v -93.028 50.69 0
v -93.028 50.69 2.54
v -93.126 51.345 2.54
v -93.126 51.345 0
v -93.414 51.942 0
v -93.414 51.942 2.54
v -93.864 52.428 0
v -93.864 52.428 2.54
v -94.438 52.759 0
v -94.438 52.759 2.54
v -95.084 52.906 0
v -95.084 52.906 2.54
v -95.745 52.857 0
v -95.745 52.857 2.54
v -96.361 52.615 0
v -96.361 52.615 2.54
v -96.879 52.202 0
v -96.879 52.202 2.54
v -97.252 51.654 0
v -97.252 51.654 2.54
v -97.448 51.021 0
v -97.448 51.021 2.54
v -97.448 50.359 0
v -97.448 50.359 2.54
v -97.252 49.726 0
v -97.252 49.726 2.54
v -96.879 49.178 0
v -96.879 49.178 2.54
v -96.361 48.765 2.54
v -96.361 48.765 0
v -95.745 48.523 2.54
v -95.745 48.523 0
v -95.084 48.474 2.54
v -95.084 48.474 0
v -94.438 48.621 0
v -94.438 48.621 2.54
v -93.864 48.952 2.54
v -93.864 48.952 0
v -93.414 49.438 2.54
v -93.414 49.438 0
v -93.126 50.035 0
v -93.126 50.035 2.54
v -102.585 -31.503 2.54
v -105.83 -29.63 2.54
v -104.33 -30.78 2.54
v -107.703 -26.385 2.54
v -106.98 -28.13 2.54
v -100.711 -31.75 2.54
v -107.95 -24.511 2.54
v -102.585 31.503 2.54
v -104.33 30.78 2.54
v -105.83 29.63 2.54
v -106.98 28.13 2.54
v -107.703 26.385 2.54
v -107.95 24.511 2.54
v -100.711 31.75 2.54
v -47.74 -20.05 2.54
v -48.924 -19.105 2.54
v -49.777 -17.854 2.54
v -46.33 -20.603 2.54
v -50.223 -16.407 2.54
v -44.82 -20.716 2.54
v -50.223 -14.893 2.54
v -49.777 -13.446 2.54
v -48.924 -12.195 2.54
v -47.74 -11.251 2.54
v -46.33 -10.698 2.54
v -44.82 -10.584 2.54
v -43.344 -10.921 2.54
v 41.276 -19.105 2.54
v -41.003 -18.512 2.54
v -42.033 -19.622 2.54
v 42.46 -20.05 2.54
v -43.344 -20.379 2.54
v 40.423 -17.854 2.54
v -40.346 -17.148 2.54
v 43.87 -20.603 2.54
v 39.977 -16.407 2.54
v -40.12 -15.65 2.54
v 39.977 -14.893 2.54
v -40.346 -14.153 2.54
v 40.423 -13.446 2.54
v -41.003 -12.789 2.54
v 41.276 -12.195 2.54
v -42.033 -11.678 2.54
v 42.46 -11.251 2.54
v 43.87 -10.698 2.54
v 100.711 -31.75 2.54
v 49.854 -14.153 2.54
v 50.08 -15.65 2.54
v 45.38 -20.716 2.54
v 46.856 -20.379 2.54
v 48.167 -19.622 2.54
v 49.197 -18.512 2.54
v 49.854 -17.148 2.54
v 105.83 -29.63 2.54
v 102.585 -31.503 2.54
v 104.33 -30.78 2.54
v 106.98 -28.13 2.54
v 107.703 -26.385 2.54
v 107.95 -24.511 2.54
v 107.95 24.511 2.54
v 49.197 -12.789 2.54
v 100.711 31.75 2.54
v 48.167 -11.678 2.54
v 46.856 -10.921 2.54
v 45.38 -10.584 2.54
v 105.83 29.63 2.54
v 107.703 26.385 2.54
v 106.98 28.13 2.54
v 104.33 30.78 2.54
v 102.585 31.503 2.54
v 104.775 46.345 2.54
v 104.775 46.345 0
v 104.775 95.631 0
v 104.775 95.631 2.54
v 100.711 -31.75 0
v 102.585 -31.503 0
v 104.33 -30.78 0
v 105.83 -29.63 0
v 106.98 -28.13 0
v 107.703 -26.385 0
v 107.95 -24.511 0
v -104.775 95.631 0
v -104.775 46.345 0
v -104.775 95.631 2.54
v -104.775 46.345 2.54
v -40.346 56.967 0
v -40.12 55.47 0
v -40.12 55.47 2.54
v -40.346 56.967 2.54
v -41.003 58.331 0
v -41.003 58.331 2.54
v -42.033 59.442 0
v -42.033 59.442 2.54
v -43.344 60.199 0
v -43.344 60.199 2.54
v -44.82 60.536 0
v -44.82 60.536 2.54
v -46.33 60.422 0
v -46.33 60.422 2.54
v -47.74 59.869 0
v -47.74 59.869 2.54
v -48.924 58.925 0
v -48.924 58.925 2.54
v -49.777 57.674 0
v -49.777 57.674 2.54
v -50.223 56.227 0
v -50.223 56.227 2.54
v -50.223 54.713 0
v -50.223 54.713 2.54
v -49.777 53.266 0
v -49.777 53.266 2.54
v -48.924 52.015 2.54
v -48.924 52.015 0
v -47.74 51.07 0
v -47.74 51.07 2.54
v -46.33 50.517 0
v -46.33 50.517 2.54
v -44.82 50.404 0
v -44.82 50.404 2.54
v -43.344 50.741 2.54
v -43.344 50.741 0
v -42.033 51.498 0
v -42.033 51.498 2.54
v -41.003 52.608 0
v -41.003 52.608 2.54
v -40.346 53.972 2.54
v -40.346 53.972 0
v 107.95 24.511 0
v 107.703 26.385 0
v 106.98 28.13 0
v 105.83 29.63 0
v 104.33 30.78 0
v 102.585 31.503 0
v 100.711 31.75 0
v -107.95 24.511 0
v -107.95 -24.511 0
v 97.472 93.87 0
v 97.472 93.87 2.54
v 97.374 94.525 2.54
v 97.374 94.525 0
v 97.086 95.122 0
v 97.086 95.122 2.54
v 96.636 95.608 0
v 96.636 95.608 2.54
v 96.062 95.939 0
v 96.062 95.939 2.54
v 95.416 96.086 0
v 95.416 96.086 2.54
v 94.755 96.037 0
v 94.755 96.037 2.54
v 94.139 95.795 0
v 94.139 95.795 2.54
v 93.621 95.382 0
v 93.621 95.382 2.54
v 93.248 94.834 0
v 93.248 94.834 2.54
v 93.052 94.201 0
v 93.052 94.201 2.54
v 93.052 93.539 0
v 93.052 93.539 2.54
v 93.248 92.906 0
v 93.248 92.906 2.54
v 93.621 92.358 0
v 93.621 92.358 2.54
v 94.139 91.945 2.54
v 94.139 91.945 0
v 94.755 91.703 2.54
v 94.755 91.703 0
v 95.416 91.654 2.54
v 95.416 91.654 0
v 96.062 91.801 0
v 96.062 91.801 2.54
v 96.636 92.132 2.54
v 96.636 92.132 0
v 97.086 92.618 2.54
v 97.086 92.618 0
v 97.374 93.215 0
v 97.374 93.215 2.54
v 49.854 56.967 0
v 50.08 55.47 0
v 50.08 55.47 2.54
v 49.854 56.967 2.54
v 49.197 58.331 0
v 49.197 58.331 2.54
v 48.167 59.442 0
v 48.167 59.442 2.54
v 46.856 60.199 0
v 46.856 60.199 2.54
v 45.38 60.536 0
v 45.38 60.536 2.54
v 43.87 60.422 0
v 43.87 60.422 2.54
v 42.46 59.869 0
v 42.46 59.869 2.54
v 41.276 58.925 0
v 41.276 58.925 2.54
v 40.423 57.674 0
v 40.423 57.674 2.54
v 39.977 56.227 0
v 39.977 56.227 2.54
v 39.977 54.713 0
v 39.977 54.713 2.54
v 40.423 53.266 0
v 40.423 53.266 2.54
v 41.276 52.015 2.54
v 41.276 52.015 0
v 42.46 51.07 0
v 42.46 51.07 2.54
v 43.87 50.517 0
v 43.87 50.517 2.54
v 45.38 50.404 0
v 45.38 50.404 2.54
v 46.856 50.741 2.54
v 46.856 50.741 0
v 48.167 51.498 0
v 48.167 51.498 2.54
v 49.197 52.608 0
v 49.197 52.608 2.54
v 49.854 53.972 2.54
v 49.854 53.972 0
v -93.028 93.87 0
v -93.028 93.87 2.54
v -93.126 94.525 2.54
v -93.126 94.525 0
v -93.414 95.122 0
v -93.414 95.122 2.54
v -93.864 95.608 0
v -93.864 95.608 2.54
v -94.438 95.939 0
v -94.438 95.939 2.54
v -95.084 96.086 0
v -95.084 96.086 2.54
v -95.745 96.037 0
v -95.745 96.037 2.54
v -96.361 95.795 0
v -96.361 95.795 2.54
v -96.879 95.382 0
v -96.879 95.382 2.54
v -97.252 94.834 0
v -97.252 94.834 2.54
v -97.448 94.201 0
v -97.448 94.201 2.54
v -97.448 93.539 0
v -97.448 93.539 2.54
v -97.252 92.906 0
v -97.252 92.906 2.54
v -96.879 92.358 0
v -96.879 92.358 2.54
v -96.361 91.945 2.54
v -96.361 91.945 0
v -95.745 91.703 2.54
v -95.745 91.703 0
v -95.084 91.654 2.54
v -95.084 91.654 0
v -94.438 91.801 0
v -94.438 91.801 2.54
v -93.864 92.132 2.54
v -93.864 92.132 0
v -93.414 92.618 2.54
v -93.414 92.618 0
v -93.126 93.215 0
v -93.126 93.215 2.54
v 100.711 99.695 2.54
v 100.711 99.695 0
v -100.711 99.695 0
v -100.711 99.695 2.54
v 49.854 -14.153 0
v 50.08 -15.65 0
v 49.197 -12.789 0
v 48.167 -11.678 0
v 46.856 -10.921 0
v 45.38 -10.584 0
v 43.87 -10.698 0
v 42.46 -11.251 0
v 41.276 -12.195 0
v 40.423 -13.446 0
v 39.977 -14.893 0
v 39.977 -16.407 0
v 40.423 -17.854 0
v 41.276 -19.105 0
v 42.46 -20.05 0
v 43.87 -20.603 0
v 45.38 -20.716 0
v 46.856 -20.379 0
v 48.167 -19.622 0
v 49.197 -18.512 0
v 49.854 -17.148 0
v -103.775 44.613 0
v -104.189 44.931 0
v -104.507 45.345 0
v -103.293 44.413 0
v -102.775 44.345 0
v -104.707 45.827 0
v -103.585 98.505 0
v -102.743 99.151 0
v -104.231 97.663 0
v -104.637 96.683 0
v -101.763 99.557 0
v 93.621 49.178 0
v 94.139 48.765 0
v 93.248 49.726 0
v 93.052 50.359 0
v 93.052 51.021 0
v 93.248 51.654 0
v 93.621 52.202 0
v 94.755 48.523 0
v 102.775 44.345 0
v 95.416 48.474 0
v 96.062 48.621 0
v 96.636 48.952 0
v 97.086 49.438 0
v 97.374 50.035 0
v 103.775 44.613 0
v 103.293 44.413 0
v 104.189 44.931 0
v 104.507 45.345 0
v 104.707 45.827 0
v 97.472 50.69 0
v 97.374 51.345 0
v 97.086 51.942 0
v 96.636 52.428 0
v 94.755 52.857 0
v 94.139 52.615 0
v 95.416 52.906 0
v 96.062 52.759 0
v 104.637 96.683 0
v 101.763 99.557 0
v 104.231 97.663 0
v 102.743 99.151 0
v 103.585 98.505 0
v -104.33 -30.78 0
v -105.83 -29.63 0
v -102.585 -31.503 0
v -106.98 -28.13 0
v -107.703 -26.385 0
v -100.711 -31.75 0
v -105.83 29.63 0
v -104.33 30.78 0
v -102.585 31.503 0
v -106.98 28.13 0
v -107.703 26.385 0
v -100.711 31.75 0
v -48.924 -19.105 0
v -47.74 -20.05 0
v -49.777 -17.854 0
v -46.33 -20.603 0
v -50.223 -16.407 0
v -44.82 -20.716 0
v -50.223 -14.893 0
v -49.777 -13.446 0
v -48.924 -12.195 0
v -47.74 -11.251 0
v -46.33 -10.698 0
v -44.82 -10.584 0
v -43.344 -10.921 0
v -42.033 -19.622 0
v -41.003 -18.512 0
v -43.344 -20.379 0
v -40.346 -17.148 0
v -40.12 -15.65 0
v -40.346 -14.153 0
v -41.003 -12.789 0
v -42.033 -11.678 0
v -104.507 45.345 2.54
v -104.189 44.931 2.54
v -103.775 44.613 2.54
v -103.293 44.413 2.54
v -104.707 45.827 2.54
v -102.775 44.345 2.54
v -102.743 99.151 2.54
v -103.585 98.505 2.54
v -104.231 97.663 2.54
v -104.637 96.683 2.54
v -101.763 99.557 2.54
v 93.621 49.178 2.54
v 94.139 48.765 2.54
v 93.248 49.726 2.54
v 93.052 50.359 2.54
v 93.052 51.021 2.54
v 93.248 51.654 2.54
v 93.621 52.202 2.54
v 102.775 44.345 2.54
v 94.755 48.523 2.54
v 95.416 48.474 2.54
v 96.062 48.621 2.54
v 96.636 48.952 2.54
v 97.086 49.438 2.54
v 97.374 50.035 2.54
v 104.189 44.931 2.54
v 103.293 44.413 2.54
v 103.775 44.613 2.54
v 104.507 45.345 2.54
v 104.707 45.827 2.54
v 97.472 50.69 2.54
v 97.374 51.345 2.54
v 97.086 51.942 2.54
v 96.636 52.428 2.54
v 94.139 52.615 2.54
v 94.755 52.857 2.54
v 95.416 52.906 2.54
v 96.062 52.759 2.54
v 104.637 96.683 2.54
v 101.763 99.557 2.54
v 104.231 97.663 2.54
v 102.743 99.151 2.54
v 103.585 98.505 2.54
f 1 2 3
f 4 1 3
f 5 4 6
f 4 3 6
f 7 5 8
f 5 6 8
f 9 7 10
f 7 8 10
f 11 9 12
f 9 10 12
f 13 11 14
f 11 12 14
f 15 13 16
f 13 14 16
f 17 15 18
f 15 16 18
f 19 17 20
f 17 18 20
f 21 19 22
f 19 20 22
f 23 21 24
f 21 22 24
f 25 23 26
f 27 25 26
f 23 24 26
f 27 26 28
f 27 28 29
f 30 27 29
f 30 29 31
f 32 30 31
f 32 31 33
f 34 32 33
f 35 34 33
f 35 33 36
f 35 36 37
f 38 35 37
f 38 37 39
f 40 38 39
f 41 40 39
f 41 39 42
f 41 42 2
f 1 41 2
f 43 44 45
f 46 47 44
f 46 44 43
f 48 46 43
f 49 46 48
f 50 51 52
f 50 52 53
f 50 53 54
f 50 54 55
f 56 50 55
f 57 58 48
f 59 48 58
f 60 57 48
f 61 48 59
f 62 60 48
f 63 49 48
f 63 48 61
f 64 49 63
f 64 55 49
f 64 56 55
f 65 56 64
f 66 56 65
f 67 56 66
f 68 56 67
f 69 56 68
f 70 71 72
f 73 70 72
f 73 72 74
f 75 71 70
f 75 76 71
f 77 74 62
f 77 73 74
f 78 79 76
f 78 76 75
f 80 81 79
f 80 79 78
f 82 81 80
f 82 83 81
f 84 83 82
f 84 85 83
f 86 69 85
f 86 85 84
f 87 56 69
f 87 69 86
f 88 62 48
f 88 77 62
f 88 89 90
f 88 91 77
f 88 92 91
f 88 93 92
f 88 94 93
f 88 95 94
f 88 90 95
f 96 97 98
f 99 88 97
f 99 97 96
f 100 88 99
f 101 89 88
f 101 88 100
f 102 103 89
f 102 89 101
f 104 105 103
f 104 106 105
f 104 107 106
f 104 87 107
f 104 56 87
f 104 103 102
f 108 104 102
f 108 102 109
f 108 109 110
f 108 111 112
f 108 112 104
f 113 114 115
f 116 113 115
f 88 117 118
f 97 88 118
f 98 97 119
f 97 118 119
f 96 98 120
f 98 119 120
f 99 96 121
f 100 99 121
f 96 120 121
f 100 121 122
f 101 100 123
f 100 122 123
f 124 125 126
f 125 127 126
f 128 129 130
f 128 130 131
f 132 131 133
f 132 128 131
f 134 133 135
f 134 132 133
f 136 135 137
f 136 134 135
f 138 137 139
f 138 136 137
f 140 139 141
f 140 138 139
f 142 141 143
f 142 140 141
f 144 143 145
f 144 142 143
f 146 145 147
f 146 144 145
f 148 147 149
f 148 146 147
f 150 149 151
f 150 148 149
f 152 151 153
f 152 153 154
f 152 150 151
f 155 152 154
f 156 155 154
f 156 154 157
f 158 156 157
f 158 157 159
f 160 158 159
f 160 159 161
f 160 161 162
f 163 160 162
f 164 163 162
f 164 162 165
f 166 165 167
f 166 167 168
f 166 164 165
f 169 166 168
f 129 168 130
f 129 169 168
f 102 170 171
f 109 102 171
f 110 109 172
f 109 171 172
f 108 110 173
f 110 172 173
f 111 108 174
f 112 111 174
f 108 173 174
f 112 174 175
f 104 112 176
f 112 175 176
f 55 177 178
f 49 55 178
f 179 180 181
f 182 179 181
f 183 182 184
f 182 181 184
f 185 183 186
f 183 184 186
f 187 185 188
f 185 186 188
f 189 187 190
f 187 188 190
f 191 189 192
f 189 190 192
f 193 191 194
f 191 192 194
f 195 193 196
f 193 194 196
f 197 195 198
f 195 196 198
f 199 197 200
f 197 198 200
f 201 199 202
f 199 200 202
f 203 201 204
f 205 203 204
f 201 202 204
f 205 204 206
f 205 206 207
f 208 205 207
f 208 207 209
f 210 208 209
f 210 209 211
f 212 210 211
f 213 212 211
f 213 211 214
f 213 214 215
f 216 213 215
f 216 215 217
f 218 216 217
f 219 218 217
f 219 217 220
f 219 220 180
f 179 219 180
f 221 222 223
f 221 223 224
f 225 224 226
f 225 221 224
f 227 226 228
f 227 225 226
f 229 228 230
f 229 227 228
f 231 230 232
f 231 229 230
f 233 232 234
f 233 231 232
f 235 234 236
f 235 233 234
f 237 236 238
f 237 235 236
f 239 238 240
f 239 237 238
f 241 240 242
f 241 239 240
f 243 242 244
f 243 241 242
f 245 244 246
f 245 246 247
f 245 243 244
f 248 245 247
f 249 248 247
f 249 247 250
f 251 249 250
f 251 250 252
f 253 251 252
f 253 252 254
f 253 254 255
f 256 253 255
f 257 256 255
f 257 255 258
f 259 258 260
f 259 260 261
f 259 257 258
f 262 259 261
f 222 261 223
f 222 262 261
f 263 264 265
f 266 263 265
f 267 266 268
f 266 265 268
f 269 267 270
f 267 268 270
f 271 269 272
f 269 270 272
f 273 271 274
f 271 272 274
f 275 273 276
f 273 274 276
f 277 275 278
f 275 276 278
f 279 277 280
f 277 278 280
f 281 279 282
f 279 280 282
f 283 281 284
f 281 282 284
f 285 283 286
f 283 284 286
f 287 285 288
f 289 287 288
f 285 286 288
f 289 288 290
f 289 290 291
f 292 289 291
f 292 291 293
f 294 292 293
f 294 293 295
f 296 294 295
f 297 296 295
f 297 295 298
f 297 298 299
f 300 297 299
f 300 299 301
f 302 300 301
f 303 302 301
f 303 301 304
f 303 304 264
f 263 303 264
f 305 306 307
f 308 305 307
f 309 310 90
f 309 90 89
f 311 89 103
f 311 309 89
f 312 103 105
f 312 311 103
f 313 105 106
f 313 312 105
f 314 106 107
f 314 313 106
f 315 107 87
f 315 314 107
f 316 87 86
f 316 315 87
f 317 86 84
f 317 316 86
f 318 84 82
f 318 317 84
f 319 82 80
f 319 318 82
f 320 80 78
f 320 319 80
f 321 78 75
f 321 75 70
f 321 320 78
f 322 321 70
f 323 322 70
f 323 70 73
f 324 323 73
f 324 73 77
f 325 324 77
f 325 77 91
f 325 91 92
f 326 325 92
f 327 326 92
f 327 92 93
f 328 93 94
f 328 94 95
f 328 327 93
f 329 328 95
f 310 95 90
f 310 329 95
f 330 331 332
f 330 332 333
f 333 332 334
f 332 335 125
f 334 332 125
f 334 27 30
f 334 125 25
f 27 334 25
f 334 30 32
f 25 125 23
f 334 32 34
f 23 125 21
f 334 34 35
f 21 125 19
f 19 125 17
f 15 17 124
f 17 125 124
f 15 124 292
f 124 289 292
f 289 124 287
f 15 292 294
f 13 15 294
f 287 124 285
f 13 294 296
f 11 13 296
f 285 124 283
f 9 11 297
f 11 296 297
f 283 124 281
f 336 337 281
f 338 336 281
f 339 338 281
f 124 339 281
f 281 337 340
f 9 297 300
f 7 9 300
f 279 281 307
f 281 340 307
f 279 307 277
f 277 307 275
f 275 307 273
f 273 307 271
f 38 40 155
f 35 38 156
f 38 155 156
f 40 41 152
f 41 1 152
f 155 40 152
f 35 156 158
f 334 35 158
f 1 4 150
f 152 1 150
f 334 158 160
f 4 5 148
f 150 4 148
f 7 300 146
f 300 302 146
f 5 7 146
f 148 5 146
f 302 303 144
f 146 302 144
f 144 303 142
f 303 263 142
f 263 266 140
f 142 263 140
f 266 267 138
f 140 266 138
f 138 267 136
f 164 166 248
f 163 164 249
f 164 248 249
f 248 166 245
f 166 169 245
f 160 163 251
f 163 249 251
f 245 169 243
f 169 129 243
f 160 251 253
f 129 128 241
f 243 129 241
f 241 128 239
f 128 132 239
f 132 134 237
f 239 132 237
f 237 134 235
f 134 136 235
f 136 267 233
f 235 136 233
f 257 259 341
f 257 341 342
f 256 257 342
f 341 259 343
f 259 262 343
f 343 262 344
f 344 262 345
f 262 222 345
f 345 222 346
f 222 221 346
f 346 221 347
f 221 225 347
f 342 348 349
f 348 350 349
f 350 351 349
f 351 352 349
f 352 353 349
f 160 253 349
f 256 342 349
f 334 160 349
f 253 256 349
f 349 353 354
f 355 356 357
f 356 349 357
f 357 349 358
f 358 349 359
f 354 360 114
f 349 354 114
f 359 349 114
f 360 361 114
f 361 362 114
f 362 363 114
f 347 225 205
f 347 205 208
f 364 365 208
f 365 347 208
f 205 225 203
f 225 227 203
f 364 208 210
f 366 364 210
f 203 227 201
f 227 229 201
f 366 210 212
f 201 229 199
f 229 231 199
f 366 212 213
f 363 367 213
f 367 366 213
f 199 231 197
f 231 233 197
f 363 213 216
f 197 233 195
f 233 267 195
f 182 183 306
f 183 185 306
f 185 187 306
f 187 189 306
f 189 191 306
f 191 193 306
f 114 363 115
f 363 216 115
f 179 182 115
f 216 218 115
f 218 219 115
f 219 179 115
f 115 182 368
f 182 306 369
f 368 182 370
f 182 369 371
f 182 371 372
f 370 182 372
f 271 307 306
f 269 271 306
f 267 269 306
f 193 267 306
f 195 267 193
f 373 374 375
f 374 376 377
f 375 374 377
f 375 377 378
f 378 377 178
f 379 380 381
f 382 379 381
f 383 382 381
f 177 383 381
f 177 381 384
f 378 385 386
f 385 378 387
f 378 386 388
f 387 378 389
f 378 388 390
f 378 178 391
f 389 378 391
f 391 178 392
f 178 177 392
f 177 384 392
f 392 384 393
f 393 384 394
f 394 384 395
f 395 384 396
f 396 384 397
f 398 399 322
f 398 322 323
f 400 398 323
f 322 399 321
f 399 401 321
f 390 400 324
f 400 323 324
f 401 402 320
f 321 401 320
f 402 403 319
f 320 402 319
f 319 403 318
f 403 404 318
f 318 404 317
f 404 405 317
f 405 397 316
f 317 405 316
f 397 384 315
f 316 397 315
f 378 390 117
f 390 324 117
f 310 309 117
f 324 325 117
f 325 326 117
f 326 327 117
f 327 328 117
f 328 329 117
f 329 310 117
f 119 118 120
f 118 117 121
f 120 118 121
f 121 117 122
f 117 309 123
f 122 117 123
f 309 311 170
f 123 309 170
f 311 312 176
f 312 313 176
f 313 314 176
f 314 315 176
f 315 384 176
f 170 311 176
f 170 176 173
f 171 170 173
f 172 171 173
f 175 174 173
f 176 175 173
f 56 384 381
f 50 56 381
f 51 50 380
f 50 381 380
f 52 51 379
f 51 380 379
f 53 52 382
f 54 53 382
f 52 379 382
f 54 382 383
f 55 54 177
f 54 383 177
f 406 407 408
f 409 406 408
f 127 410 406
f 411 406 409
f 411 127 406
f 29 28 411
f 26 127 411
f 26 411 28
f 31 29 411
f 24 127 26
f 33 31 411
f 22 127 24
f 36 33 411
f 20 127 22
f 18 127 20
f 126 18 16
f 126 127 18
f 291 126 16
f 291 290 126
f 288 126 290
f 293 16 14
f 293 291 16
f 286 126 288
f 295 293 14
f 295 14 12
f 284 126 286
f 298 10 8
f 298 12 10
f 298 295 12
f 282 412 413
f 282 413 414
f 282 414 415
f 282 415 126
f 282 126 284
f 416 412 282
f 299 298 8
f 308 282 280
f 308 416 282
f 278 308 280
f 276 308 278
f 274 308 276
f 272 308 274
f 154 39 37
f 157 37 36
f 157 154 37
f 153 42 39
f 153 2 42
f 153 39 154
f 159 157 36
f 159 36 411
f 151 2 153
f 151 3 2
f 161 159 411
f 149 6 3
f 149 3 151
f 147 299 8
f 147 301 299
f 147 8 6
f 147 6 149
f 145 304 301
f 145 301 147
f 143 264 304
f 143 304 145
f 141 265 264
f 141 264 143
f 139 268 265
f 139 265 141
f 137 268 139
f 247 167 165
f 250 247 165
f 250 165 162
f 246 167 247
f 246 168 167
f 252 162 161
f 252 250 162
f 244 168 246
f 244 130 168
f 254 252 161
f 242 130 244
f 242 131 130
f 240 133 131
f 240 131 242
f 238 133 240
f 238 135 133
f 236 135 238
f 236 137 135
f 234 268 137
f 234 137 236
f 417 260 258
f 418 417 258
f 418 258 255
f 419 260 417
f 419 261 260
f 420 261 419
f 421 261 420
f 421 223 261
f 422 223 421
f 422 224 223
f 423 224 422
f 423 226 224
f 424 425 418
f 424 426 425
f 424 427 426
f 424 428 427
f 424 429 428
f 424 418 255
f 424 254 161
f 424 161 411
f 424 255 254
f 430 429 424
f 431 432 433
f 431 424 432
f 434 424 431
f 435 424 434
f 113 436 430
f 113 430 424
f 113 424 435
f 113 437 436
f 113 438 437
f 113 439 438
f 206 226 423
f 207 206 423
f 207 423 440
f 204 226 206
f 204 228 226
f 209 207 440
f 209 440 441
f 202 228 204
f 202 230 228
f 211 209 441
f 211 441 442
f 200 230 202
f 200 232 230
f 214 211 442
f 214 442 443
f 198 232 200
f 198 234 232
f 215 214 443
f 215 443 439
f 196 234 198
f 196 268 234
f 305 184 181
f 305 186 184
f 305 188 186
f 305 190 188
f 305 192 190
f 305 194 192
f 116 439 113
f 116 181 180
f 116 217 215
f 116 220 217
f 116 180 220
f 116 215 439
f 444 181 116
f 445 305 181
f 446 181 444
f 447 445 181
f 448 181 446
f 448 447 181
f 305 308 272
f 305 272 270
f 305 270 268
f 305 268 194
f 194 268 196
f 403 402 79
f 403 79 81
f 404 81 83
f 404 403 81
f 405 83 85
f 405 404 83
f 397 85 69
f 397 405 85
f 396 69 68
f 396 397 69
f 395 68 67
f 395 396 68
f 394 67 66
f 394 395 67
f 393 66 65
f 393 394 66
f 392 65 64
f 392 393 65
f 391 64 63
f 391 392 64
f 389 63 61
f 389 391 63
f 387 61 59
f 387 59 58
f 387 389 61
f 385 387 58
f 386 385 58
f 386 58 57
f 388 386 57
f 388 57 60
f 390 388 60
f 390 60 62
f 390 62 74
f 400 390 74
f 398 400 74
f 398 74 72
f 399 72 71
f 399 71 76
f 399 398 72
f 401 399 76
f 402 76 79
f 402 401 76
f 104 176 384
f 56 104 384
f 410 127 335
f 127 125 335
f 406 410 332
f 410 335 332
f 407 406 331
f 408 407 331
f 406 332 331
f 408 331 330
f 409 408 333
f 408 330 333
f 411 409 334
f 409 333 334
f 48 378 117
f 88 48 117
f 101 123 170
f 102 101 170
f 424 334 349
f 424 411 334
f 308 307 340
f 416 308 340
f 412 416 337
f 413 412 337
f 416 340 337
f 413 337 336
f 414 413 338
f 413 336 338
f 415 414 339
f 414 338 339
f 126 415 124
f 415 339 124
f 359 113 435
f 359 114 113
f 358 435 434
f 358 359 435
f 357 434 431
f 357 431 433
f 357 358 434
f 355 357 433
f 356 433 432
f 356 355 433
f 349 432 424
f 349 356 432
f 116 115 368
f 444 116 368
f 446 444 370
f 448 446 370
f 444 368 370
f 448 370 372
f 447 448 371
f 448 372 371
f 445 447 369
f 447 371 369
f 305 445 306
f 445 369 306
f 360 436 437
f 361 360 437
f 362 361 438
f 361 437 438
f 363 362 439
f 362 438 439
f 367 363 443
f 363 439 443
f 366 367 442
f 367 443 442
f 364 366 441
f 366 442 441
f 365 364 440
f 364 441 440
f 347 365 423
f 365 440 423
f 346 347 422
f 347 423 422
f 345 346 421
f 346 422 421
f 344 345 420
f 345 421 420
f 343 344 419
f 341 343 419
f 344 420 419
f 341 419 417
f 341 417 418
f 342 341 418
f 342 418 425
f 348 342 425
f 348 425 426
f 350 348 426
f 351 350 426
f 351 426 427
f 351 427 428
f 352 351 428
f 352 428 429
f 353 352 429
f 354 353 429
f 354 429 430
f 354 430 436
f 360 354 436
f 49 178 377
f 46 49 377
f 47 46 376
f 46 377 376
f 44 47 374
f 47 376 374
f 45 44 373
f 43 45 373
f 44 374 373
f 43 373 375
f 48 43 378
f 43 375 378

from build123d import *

# Parameters (mm, degrees)
SKETCH1_R             = 5.08
BOSS_EXTRUDE1_DEPTH   = 2.54
BOSS_EXTRUDE1_2_DEPTH = 2.54
SKETCH9_W             = 20
SKETCH9_H             = 6
BOSS_EXTRUDE4_DEPTH   = 2.54
FILLET1_R             = 2
SKETCH10_R            = 2.2225
CUT_EXTRUDE5_DEPTH    = 147.965122138


with BuildPart() as part:
    # Sketch1 → Boss-Extrude1 (new body)
    with BuildSketch(Plane.XY):
        with BuildLine():
            Line((-52.6295, -31.75), (-37.7705, -31.75))
            Line((-37.7705, -31.75), (37.5705, -31.75))
            Line((37.5705, -31.75), (52.4295, -31.75))
            Line((52.4295, -31.75), (100.711, -31.75))
            ThreePointArc((100.711, -31.75), (105.829745989, -29.629745989), (107.95, -24.511))
            Line((107.95, -24.511), (107.95, 24.511))
            ThreePointArc((107.95, 24.511), (105.829745989, 29.629745989), (100.711, 31.75))
            Line((100.711, 31.75), (-100.711, 31.75))
            ThreePointArc((-100.711, 31.75), (-105.829745989, 29.629745989), (-107.95, 24.511))
            Line((-107.95, 24.511), (-107.95, -24.511))
            ThreePointArc((-107.95, -24.511), (-105.829745989, -29.629745989), (-100.711, -31.75))
            Line((-100.711, -31.75), (-52.6295, -31.75))
        make_face()
        with Locations((-45.2, -15.6502)):
            Circle(SKETCH1_R, mode=Mode.SUBTRACT)
        with Locations((45, -15.6502)):
            Circle(SKETCH1_R, mode=Mode.SUBTRACT)
    extrude(amount=BOSS_EXTRUDE1_DEPTH)


with BuildPart() as body_2:
    # Sketch1 → Boss-Extrude1 2 (new body)
    with BuildSketch(Plane.XY):
        with BuildLine():
            Line((100.711, 99.695), (-100.711, 99.695))
            ThreePointArc((-100.711, 99.695), (-103.584681959, 98.504681959), (-104.775, 95.631))
            Line((-104.775, 95.631), (-104.775, 50.345))
            Line((-104.775, 50.345), (-84.775, 50.345))
            Line((-84.775, 50.345), (-84.775, 44.345))
            Line((-84.775, 44.345), (84.775, 44.345))
            Line((84.775, 44.345), (84.775, 50.345))
            Line((84.775, 50.345), (104.775, 50.345))
            Line((104.775, 50.345), (104.775, 95.631))
            ThreePointArc((104.775, 95.631), (103.584681959, 98.504681959), (100.711, 99.695))
        make_face()
        with Locations((-45.2, 55.4698)):
            Circle(SKETCH1_R, mode=Mode.SUBTRACT)
        with Locations((45, 55.4698)):
            Circle(SKETCH1_R, mode=Mode.SUBTRACT)
    extrude(amount=BOSS_EXTRUDE1_2_DEPTH)

    # Sketch9 → Boss-Extrude4 (add)
    with BuildSketch(Plane.XY.offset(2.54)):
        with Locations((-94.775, 47.345)):
            Rectangle(SKETCH9_W, SKETCH9_H)
        with Locations((94.775, 47.345)):
            Rectangle(SKETCH9_W, SKETCH9_H)
    extrude(amount=-BOSS_EXTRUDE4_DEPTH)

    # Fillet1
    fillet1_edges = [body_2.edges().sort_by_distance(p)[0] for p in [
        (-104.775, 44.345, 1.27),
        (104.775, 44.345, 1.27),
    ]]
    fillet(fillet1_edges, radius=FILLET1_R)

    # Sketch10 → Cut-Extrude5 (cut, through all)
    with BuildSketch(Plane.XY.offset(2.54)):
        with Locations((95.25, 93.87)):
            Circle(SKETCH10_R)
        with Locations((95.25, 50.69)):
            Circle(SKETCH10_R)
        with Locations((-95.25, 50.69)):
            Circle(SKETCH10_R)
        with Locations((-95.25, 93.87)):
            Circle(SKETCH10_R)
    extrude(amount=-CUT_EXTRUDE5_DEPTH, mode=Mode.SUBTRACT)


solid = Compound([part.part, body_2.part])
